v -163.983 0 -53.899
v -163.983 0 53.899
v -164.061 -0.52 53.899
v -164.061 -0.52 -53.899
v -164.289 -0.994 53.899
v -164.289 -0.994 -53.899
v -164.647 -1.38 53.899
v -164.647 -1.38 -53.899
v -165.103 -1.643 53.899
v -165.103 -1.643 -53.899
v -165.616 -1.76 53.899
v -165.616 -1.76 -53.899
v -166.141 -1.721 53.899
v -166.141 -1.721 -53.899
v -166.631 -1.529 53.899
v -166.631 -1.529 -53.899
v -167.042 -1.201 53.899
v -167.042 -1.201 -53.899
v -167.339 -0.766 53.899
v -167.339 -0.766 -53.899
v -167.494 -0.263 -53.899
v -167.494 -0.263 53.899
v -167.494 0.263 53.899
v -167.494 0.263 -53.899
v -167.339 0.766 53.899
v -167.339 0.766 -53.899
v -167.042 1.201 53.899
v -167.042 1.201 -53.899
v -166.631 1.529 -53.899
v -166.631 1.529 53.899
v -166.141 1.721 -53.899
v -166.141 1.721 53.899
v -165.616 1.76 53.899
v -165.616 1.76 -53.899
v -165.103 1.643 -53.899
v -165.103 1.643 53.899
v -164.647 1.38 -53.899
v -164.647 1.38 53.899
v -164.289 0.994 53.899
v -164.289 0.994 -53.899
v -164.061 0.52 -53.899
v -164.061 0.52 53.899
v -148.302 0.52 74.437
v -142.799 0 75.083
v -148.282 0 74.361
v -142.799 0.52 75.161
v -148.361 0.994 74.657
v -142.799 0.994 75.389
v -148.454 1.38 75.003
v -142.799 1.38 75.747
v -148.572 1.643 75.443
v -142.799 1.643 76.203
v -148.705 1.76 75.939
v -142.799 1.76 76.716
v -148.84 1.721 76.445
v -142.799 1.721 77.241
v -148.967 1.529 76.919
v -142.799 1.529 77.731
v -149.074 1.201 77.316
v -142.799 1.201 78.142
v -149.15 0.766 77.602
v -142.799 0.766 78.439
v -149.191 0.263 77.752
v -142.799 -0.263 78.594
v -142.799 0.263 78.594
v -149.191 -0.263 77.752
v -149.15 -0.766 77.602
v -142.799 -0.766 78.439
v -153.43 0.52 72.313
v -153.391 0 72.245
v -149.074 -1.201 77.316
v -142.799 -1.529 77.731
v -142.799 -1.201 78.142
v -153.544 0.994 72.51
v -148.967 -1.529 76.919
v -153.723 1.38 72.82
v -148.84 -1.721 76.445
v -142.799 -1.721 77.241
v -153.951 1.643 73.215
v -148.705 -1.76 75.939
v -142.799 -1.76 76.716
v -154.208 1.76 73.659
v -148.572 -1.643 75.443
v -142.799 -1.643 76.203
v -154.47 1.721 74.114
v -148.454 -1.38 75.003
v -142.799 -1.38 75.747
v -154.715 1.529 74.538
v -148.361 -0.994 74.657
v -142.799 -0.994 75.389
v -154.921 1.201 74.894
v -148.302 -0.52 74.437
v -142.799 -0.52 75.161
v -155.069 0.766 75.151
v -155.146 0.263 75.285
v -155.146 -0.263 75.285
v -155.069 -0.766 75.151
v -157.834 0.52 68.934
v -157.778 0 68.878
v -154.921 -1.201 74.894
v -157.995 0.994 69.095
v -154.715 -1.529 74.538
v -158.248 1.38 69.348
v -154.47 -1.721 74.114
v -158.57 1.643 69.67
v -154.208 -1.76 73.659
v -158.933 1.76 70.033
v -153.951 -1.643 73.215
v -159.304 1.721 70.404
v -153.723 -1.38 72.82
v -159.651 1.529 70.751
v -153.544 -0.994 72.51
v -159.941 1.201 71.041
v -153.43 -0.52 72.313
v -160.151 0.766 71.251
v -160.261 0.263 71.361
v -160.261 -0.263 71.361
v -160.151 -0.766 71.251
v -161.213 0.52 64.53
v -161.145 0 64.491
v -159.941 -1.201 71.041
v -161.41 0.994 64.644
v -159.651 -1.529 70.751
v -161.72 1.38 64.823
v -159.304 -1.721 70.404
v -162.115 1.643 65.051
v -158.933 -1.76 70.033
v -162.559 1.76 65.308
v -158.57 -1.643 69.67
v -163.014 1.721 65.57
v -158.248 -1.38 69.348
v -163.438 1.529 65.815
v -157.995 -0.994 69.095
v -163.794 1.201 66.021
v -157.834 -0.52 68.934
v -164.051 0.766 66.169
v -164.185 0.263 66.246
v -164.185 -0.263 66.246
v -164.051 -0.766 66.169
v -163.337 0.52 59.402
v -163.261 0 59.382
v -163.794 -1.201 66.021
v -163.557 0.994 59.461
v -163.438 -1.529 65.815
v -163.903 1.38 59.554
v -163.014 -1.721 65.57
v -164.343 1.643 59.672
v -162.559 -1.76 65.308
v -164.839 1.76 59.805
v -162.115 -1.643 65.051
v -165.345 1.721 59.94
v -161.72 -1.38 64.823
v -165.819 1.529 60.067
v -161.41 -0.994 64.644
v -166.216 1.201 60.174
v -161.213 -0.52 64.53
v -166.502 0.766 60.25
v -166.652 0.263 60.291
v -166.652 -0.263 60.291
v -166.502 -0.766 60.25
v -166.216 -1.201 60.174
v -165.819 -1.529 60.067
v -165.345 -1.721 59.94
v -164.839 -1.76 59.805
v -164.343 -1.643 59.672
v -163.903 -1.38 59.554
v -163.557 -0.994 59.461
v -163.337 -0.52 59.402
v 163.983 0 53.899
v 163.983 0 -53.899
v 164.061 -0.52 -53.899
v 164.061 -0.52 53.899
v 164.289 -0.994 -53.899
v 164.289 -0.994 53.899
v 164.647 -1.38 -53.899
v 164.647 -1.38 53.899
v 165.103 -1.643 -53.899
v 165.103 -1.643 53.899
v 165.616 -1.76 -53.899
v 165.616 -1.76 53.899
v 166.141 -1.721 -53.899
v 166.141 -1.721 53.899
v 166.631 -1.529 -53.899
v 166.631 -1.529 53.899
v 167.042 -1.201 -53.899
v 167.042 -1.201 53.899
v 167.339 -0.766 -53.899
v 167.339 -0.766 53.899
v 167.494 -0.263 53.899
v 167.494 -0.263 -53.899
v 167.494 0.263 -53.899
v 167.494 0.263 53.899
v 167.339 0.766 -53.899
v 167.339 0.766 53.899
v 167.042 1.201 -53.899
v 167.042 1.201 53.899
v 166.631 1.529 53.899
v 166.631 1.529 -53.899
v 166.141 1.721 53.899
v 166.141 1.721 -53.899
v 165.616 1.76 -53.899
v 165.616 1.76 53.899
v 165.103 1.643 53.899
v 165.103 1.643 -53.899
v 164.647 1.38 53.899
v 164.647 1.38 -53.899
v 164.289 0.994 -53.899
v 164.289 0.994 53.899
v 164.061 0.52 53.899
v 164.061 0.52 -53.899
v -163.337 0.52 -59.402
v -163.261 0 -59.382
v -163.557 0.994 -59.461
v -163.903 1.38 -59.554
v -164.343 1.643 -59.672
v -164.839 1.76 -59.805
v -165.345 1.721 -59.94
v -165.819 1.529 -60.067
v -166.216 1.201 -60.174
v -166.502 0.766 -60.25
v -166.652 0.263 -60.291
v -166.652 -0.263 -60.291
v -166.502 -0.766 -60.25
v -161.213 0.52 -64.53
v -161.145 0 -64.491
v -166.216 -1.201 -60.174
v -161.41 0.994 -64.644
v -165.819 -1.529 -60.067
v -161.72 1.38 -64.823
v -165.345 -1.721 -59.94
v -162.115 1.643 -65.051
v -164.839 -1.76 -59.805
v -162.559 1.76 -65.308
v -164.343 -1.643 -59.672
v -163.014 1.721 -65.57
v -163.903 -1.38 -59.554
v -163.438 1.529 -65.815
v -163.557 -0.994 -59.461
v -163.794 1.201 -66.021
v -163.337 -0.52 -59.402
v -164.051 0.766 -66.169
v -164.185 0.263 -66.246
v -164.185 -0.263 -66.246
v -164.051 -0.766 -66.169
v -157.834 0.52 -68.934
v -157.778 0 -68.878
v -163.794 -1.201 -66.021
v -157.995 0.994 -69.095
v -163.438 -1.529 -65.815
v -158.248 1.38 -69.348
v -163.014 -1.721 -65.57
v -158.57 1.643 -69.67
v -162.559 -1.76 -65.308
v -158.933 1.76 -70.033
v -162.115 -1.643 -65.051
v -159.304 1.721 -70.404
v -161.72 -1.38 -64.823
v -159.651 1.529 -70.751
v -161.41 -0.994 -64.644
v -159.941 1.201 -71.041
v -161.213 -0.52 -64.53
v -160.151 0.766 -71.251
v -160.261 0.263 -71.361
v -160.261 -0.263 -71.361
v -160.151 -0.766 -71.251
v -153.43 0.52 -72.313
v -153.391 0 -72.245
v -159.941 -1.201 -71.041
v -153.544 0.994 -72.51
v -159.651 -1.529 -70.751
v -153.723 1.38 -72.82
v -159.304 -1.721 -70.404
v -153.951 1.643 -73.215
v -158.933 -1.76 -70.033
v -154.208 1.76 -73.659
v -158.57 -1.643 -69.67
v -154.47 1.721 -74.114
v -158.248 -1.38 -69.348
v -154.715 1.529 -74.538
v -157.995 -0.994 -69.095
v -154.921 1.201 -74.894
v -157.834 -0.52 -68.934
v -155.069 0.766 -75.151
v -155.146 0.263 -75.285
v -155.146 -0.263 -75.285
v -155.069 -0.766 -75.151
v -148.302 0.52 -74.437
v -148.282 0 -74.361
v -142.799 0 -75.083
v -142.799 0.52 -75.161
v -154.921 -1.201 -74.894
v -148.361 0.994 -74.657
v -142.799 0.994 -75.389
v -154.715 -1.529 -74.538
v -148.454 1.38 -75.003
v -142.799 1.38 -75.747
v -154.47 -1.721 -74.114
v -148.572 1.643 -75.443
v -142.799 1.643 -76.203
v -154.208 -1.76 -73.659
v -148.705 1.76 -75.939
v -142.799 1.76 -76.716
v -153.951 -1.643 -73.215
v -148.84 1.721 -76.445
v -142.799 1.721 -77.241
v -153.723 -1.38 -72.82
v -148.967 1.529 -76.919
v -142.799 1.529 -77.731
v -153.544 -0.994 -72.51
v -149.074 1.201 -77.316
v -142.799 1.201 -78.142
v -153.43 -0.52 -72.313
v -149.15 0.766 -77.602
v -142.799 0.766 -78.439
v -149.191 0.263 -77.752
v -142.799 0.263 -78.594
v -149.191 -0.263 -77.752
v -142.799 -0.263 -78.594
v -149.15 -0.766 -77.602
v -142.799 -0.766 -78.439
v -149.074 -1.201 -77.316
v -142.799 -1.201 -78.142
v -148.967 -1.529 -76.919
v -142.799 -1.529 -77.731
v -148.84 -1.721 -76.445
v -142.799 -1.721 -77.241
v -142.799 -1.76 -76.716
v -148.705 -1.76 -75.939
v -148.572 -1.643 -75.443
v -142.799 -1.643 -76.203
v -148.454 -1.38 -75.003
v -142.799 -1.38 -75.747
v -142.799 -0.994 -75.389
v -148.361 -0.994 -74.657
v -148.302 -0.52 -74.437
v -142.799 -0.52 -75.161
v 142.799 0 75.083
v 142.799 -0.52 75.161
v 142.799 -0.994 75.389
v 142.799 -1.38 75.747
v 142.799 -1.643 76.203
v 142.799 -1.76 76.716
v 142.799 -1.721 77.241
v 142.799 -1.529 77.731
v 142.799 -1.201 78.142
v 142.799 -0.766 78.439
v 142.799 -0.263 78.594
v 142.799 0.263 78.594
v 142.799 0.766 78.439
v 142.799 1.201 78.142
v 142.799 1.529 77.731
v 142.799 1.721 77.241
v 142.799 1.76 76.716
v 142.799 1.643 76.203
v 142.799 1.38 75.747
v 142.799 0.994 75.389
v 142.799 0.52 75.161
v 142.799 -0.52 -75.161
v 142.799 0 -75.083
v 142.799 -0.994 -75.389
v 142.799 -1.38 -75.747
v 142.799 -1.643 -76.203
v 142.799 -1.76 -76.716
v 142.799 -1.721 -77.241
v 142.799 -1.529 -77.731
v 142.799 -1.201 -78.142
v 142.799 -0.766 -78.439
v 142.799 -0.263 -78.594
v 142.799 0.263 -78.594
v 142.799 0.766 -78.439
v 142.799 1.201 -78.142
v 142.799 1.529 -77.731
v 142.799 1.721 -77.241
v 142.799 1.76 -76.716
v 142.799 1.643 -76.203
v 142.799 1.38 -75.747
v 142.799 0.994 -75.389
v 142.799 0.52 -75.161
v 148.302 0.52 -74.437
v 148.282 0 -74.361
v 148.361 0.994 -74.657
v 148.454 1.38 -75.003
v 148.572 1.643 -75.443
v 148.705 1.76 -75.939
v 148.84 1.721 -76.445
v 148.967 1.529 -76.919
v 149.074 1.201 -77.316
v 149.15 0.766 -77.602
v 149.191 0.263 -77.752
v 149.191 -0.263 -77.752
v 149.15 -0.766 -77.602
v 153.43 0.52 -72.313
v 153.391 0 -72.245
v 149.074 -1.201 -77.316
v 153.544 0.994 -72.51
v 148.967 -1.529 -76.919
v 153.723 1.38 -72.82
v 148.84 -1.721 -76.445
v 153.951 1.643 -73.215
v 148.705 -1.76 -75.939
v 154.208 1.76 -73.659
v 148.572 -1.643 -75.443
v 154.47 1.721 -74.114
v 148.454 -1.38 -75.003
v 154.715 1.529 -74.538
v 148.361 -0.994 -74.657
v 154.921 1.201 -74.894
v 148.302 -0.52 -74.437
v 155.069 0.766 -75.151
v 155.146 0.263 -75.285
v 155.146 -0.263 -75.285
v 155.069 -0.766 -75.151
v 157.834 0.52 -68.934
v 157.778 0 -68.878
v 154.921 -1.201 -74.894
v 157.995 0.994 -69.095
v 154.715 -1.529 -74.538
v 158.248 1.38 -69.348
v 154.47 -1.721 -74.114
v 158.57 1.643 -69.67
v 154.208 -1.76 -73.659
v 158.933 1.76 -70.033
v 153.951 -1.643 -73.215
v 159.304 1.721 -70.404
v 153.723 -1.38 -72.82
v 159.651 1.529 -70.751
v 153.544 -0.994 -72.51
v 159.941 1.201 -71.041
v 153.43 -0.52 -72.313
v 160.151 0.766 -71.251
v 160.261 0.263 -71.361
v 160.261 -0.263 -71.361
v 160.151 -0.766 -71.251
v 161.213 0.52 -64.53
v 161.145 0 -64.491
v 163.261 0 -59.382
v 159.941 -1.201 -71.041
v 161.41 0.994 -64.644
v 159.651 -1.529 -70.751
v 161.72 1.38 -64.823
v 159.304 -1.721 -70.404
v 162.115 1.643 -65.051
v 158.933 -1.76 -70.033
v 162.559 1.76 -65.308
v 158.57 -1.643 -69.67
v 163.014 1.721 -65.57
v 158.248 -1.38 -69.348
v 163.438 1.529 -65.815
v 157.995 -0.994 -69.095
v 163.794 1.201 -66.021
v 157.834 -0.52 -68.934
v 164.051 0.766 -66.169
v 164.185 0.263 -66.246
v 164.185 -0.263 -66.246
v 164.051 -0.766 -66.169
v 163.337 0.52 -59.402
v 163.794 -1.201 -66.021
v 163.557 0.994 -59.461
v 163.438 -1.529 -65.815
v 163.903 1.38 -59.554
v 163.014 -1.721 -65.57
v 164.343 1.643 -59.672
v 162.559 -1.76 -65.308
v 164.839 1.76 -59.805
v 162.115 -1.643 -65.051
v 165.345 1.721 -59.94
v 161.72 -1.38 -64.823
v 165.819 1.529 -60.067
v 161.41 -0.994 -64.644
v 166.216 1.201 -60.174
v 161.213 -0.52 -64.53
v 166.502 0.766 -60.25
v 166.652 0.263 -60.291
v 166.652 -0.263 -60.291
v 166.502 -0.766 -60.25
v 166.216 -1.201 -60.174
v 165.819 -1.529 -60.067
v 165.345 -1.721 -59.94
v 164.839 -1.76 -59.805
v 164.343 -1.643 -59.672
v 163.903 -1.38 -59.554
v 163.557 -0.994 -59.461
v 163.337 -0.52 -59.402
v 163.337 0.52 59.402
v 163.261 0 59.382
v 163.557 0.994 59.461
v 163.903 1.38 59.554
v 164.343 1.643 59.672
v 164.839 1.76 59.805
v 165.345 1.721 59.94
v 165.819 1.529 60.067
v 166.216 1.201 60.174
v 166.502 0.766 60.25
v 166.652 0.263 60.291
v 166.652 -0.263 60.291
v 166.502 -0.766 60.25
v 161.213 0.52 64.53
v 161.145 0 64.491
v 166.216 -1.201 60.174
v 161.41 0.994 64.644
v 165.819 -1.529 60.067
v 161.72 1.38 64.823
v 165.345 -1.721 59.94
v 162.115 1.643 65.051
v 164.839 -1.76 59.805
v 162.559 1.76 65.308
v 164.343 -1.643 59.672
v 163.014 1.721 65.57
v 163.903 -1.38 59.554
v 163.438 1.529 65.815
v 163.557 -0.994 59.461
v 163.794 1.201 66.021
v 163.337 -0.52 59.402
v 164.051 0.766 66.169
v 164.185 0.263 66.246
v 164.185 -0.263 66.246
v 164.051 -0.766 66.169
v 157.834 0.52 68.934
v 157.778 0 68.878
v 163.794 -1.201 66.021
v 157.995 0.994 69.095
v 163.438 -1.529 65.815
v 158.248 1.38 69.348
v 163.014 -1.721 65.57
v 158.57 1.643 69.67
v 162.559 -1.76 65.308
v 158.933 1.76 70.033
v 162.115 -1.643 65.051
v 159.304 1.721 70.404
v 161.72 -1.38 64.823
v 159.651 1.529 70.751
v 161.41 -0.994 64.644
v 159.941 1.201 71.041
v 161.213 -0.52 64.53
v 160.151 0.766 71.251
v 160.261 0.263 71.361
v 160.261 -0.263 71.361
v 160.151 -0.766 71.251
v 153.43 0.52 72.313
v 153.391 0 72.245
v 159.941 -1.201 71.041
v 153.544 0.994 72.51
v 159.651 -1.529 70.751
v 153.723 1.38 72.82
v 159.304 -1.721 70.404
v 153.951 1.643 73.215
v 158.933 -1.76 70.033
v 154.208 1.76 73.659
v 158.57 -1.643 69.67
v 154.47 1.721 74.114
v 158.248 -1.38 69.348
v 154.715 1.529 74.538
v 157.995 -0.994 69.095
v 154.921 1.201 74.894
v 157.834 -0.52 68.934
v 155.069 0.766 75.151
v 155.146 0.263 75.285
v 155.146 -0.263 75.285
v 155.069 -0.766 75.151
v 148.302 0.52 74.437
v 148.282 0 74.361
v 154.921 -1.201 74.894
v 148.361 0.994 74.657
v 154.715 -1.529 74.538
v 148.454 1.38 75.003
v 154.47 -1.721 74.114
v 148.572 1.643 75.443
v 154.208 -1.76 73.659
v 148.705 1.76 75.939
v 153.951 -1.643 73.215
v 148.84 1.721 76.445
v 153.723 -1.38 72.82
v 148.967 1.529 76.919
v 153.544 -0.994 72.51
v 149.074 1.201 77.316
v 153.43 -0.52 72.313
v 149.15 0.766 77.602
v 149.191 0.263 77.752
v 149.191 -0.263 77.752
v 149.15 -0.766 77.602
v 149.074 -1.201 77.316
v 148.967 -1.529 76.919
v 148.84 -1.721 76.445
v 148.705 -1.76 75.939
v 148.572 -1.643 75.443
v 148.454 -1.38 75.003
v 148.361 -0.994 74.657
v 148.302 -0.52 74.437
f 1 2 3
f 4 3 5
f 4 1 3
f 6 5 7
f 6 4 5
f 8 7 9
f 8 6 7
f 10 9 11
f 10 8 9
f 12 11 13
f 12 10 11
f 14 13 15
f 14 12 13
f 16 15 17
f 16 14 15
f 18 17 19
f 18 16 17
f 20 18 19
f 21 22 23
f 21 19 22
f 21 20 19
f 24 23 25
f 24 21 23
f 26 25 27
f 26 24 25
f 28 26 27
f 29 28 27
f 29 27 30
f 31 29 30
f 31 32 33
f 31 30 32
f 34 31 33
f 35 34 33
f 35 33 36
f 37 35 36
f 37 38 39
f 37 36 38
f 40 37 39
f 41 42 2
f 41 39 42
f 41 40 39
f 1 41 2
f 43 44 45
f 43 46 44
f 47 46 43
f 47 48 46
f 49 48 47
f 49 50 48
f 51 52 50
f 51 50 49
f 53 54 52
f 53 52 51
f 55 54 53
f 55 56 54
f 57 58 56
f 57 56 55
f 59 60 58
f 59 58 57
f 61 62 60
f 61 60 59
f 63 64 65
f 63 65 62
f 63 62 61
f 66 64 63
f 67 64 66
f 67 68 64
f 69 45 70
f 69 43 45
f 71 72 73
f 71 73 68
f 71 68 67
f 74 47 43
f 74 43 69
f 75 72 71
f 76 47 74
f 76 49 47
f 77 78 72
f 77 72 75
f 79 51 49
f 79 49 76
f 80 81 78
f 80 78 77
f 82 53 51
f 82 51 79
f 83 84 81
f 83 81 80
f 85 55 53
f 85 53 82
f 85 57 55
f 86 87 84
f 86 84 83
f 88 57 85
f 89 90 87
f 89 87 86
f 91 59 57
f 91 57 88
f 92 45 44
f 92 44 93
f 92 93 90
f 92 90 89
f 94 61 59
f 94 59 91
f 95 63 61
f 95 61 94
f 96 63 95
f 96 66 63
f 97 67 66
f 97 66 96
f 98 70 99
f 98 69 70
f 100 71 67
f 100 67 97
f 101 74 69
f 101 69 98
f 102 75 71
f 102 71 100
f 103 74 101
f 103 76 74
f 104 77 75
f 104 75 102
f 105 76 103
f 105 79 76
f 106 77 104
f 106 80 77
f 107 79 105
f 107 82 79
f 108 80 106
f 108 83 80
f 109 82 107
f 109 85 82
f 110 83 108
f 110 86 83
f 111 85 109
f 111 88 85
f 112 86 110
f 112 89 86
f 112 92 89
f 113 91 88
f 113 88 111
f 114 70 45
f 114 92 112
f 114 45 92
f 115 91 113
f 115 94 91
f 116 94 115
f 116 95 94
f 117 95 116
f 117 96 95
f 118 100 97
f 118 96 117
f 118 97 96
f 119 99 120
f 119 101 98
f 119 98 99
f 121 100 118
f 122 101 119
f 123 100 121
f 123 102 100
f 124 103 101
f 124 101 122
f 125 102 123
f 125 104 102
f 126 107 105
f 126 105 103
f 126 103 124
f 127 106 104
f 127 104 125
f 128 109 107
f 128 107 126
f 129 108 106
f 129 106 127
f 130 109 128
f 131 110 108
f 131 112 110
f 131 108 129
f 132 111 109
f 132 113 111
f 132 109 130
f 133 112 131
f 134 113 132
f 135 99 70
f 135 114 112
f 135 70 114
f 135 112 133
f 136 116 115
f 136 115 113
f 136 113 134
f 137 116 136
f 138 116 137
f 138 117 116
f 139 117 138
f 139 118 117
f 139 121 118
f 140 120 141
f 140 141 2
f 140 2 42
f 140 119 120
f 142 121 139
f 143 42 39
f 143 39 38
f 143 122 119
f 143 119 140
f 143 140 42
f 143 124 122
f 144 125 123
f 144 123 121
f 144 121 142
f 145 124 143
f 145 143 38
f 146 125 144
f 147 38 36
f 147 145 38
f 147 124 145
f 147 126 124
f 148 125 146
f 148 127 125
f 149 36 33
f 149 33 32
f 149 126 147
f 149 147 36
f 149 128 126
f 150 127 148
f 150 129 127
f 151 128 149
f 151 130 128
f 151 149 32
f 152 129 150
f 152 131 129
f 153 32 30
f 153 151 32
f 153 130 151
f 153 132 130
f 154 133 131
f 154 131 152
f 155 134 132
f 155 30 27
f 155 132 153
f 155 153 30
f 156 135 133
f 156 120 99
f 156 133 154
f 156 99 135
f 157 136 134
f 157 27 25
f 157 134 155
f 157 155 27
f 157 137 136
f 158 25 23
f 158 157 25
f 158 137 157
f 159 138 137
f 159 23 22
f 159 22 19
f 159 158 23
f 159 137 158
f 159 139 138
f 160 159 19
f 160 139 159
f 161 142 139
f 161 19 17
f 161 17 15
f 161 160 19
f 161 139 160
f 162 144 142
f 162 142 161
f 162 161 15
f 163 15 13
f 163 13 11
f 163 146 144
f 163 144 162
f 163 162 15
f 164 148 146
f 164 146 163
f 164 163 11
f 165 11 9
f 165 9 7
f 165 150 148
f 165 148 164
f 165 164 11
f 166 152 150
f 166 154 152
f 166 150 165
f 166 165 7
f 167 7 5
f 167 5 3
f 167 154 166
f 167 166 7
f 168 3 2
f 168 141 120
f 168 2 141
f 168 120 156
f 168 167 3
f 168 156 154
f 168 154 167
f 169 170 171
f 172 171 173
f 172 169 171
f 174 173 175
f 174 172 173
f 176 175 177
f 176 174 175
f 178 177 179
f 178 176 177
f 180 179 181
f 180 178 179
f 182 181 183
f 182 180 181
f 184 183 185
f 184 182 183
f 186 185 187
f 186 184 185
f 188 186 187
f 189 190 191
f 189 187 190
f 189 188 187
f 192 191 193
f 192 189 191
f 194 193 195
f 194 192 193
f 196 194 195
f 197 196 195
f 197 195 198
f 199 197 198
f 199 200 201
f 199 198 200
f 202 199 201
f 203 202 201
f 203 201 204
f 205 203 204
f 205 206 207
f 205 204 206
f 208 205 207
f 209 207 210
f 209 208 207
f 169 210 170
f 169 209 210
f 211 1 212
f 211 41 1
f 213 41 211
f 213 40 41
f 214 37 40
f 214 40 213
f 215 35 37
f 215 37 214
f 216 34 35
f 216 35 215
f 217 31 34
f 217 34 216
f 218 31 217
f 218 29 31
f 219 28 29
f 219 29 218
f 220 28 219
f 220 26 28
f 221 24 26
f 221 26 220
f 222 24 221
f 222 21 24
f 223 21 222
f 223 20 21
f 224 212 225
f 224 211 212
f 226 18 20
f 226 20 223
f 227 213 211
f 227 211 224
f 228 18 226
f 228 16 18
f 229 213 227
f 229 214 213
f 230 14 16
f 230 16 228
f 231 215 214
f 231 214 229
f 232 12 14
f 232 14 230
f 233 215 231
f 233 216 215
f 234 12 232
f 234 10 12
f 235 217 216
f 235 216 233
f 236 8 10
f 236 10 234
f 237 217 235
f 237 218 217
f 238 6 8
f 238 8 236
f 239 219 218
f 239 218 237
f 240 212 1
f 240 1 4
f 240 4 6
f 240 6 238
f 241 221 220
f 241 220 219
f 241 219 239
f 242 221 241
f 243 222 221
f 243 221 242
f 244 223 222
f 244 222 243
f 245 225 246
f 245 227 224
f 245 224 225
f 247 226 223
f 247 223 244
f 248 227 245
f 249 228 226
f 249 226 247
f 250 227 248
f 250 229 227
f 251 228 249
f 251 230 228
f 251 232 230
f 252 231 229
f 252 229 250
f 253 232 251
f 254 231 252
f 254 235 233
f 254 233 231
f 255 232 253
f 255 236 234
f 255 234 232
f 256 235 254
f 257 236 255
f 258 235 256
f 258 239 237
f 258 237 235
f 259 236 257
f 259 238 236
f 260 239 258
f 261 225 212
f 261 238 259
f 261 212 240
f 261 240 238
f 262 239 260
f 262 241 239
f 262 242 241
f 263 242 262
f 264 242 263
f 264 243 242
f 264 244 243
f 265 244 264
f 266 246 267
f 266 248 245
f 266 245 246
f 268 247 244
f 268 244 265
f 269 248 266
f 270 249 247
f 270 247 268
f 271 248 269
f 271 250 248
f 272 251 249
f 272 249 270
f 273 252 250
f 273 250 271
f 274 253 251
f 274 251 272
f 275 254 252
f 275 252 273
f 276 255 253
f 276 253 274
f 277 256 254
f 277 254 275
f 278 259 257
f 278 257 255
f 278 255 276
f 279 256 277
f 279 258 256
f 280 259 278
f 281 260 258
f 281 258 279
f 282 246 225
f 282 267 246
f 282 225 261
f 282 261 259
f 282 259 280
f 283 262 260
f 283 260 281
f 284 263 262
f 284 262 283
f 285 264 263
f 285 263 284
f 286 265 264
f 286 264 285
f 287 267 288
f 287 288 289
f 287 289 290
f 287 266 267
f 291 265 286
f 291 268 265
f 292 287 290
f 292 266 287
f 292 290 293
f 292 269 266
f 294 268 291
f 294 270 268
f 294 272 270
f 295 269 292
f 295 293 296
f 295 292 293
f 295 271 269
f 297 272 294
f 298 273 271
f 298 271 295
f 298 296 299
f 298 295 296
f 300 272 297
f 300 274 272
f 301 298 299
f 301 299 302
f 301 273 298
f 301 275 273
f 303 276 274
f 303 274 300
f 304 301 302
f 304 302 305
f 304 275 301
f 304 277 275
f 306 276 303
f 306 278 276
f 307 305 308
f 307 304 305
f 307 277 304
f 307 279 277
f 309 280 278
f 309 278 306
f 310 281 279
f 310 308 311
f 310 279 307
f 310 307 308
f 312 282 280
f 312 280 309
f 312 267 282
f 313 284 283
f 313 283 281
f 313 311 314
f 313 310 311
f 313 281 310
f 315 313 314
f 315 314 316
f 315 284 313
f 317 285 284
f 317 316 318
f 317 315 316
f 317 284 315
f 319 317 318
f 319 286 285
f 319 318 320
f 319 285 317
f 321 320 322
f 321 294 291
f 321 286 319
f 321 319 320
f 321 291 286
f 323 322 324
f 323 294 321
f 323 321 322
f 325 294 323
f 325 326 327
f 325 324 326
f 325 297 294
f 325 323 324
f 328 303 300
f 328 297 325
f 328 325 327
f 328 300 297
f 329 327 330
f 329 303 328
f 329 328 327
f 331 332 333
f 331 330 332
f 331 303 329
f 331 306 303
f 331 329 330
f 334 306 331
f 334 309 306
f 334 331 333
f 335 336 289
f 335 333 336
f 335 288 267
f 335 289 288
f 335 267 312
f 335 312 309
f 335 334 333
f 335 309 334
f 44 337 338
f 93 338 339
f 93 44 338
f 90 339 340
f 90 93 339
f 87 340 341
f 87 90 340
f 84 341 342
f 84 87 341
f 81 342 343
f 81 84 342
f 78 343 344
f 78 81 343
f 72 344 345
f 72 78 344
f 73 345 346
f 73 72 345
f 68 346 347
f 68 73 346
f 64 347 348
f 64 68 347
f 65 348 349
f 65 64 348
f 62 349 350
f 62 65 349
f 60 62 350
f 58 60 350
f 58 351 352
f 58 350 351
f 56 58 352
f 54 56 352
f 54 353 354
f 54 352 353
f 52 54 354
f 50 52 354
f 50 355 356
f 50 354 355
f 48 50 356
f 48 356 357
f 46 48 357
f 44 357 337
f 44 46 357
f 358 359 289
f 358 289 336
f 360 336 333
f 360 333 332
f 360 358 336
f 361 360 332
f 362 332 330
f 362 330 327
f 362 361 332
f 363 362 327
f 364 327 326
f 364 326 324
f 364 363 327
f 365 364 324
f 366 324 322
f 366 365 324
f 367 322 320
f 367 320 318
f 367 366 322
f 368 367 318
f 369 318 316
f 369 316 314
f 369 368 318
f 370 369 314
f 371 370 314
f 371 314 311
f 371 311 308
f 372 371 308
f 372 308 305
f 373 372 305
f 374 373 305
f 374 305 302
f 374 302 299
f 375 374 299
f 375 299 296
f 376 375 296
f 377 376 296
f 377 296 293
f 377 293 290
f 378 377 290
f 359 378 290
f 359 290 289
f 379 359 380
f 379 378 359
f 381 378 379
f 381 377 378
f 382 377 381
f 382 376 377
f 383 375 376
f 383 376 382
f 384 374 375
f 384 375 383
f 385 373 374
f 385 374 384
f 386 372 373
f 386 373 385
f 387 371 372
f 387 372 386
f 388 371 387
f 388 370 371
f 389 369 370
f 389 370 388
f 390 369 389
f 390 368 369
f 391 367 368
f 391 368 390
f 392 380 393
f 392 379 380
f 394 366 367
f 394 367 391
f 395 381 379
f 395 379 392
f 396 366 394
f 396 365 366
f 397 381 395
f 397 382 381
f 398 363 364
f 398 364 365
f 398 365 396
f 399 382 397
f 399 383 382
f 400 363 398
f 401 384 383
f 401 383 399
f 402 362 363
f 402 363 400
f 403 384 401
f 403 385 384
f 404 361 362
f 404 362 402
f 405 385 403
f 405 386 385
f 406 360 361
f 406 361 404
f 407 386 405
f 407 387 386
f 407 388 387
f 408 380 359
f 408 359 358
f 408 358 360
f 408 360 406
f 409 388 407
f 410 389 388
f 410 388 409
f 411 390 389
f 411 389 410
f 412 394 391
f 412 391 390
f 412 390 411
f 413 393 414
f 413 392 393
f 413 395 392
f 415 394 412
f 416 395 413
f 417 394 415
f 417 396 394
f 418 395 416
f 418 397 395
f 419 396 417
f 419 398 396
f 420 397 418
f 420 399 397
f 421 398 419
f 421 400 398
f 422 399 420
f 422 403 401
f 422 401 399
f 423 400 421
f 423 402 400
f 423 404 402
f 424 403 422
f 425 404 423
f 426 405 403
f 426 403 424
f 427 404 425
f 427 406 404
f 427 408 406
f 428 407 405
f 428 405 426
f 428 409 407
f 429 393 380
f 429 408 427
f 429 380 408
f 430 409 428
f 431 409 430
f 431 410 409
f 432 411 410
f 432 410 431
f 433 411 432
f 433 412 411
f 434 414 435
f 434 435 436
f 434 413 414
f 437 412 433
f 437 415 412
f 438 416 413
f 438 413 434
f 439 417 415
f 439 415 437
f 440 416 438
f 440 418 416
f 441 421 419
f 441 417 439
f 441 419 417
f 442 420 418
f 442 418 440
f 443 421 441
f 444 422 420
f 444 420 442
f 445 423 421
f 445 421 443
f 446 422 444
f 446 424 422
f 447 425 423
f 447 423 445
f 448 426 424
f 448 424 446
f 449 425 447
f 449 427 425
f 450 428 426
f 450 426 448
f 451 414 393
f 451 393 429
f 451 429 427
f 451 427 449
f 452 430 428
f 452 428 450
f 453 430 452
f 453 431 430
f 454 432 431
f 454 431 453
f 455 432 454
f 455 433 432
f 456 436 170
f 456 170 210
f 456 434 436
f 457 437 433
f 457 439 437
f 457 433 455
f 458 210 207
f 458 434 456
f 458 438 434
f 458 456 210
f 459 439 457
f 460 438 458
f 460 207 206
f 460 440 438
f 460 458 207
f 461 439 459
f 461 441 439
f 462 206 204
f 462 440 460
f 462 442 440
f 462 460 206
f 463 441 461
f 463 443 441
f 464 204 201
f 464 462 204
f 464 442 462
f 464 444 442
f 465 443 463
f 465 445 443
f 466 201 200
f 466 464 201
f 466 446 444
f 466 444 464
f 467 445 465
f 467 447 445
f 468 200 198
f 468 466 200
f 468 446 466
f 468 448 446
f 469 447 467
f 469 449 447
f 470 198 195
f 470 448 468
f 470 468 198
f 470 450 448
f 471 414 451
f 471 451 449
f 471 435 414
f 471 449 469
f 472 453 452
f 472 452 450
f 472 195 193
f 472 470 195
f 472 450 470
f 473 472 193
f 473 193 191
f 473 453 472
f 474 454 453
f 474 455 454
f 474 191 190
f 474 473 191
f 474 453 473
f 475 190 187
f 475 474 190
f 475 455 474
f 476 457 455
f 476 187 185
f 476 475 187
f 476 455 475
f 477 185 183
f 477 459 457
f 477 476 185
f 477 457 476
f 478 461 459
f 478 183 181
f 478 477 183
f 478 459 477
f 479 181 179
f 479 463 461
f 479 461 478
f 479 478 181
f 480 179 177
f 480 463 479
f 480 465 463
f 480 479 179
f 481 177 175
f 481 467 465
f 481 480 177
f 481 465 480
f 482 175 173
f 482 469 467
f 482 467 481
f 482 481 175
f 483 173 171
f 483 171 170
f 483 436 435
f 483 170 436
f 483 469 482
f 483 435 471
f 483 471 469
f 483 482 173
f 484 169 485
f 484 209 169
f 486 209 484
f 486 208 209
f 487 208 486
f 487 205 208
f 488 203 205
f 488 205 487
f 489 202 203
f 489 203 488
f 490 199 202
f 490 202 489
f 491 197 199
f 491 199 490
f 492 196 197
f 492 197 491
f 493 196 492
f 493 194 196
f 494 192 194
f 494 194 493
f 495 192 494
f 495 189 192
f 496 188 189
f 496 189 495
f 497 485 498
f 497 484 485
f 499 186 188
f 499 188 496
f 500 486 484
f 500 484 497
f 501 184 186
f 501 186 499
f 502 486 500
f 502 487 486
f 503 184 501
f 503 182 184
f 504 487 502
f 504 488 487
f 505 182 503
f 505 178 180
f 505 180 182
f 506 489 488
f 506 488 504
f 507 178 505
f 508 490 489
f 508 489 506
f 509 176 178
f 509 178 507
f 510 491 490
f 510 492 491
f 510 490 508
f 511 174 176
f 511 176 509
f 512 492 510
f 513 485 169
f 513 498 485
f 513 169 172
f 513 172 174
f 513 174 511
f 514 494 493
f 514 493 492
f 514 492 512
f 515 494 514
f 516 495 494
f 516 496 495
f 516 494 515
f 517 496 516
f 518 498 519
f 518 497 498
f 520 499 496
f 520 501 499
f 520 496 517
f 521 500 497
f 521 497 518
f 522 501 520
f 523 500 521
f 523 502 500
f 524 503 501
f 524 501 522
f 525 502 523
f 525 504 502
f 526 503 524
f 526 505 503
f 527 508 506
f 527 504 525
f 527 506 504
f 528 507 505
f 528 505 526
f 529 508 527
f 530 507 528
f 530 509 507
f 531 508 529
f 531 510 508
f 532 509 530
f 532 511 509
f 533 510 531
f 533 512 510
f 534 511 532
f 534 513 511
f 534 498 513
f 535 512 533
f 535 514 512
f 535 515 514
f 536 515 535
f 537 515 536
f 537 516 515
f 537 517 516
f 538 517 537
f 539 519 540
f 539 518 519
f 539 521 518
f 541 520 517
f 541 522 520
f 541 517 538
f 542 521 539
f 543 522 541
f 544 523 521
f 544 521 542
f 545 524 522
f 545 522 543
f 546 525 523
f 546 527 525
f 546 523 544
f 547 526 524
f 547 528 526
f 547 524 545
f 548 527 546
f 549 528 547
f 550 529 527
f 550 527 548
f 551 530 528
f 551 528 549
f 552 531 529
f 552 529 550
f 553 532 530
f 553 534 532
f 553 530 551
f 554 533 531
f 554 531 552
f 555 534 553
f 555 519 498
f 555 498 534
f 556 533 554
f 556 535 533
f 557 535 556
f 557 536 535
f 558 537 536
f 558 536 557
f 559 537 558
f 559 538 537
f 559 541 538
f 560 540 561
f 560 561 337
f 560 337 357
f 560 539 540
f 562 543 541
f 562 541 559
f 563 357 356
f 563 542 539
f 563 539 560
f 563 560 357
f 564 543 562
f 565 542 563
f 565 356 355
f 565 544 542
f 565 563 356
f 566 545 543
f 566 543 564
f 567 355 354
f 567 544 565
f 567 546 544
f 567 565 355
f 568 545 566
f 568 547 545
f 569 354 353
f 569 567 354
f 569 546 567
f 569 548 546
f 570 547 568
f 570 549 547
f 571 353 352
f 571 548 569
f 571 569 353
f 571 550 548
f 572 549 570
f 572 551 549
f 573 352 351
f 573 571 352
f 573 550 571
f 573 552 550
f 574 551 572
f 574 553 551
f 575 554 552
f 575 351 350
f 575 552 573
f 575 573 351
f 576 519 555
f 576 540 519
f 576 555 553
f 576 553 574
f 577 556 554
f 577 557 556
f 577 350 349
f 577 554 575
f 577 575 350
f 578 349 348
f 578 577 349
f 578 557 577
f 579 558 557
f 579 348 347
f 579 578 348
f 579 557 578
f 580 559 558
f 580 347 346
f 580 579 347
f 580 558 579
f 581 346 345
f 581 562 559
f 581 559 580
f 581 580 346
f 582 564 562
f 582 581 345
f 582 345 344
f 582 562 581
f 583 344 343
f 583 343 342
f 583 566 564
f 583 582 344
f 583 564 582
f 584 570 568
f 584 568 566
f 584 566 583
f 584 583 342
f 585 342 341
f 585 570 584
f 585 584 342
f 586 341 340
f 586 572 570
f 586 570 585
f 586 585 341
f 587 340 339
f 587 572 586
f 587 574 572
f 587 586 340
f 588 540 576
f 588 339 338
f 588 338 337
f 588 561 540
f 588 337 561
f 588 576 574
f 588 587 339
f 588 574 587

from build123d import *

# Parameters (mm, degrees)
SKETCH2_R = 1.7653


with BuildPart() as part:
    # Sweep1: sweep along a path in Sketch1
    with BuildLine(Plane(origin=(0, 0, 0), x_dir=(1, 0, 0), z_dir=(0, 1, 0))) as sweep1_path:
        Line((-142.799128817, 75.082728817), (142.799128817, 75.082728817))
        ThreePointArc((142.799128817, 75.082728817), (157.778196027, 68.878196027), (163.982728817, 53.899128817))
        Line((163.982728817, 53.899128817), (163.982728817, -53.899128817))
        ThreePointArc((163.982728817, -53.899128817), (157.778196027, -68.878196027), (142.799128817, -75.082728817))
        Line((142.799128817, -75.082728817), (-142.799128817, -75.082728817))
        ThreePointArc((-142.799128817, -75.082728817), (-157.778196027, -68.878196027), (-163.982728817, -53.899128817))
        Line((-163.982728817, -53.899128817), (-163.982728817, 53.899128817))
        ThreePointArc((-163.982728817, 53.899128817), (-157.778196027, 68.878196027), (-142.799128817, 75.082728817))
    # Sketch2 → Sweep1 (sweep)
    with BuildSketch(Plane(origin=(0, 0, 0), x_dir=(0, 0, -1), z_dir=(1, 0, 0))):
        with Locations((-76.848028817, 0)):
            Circle(SKETCH2_R)
    sweep(path=sweep1_path.line)


solid = part.part
